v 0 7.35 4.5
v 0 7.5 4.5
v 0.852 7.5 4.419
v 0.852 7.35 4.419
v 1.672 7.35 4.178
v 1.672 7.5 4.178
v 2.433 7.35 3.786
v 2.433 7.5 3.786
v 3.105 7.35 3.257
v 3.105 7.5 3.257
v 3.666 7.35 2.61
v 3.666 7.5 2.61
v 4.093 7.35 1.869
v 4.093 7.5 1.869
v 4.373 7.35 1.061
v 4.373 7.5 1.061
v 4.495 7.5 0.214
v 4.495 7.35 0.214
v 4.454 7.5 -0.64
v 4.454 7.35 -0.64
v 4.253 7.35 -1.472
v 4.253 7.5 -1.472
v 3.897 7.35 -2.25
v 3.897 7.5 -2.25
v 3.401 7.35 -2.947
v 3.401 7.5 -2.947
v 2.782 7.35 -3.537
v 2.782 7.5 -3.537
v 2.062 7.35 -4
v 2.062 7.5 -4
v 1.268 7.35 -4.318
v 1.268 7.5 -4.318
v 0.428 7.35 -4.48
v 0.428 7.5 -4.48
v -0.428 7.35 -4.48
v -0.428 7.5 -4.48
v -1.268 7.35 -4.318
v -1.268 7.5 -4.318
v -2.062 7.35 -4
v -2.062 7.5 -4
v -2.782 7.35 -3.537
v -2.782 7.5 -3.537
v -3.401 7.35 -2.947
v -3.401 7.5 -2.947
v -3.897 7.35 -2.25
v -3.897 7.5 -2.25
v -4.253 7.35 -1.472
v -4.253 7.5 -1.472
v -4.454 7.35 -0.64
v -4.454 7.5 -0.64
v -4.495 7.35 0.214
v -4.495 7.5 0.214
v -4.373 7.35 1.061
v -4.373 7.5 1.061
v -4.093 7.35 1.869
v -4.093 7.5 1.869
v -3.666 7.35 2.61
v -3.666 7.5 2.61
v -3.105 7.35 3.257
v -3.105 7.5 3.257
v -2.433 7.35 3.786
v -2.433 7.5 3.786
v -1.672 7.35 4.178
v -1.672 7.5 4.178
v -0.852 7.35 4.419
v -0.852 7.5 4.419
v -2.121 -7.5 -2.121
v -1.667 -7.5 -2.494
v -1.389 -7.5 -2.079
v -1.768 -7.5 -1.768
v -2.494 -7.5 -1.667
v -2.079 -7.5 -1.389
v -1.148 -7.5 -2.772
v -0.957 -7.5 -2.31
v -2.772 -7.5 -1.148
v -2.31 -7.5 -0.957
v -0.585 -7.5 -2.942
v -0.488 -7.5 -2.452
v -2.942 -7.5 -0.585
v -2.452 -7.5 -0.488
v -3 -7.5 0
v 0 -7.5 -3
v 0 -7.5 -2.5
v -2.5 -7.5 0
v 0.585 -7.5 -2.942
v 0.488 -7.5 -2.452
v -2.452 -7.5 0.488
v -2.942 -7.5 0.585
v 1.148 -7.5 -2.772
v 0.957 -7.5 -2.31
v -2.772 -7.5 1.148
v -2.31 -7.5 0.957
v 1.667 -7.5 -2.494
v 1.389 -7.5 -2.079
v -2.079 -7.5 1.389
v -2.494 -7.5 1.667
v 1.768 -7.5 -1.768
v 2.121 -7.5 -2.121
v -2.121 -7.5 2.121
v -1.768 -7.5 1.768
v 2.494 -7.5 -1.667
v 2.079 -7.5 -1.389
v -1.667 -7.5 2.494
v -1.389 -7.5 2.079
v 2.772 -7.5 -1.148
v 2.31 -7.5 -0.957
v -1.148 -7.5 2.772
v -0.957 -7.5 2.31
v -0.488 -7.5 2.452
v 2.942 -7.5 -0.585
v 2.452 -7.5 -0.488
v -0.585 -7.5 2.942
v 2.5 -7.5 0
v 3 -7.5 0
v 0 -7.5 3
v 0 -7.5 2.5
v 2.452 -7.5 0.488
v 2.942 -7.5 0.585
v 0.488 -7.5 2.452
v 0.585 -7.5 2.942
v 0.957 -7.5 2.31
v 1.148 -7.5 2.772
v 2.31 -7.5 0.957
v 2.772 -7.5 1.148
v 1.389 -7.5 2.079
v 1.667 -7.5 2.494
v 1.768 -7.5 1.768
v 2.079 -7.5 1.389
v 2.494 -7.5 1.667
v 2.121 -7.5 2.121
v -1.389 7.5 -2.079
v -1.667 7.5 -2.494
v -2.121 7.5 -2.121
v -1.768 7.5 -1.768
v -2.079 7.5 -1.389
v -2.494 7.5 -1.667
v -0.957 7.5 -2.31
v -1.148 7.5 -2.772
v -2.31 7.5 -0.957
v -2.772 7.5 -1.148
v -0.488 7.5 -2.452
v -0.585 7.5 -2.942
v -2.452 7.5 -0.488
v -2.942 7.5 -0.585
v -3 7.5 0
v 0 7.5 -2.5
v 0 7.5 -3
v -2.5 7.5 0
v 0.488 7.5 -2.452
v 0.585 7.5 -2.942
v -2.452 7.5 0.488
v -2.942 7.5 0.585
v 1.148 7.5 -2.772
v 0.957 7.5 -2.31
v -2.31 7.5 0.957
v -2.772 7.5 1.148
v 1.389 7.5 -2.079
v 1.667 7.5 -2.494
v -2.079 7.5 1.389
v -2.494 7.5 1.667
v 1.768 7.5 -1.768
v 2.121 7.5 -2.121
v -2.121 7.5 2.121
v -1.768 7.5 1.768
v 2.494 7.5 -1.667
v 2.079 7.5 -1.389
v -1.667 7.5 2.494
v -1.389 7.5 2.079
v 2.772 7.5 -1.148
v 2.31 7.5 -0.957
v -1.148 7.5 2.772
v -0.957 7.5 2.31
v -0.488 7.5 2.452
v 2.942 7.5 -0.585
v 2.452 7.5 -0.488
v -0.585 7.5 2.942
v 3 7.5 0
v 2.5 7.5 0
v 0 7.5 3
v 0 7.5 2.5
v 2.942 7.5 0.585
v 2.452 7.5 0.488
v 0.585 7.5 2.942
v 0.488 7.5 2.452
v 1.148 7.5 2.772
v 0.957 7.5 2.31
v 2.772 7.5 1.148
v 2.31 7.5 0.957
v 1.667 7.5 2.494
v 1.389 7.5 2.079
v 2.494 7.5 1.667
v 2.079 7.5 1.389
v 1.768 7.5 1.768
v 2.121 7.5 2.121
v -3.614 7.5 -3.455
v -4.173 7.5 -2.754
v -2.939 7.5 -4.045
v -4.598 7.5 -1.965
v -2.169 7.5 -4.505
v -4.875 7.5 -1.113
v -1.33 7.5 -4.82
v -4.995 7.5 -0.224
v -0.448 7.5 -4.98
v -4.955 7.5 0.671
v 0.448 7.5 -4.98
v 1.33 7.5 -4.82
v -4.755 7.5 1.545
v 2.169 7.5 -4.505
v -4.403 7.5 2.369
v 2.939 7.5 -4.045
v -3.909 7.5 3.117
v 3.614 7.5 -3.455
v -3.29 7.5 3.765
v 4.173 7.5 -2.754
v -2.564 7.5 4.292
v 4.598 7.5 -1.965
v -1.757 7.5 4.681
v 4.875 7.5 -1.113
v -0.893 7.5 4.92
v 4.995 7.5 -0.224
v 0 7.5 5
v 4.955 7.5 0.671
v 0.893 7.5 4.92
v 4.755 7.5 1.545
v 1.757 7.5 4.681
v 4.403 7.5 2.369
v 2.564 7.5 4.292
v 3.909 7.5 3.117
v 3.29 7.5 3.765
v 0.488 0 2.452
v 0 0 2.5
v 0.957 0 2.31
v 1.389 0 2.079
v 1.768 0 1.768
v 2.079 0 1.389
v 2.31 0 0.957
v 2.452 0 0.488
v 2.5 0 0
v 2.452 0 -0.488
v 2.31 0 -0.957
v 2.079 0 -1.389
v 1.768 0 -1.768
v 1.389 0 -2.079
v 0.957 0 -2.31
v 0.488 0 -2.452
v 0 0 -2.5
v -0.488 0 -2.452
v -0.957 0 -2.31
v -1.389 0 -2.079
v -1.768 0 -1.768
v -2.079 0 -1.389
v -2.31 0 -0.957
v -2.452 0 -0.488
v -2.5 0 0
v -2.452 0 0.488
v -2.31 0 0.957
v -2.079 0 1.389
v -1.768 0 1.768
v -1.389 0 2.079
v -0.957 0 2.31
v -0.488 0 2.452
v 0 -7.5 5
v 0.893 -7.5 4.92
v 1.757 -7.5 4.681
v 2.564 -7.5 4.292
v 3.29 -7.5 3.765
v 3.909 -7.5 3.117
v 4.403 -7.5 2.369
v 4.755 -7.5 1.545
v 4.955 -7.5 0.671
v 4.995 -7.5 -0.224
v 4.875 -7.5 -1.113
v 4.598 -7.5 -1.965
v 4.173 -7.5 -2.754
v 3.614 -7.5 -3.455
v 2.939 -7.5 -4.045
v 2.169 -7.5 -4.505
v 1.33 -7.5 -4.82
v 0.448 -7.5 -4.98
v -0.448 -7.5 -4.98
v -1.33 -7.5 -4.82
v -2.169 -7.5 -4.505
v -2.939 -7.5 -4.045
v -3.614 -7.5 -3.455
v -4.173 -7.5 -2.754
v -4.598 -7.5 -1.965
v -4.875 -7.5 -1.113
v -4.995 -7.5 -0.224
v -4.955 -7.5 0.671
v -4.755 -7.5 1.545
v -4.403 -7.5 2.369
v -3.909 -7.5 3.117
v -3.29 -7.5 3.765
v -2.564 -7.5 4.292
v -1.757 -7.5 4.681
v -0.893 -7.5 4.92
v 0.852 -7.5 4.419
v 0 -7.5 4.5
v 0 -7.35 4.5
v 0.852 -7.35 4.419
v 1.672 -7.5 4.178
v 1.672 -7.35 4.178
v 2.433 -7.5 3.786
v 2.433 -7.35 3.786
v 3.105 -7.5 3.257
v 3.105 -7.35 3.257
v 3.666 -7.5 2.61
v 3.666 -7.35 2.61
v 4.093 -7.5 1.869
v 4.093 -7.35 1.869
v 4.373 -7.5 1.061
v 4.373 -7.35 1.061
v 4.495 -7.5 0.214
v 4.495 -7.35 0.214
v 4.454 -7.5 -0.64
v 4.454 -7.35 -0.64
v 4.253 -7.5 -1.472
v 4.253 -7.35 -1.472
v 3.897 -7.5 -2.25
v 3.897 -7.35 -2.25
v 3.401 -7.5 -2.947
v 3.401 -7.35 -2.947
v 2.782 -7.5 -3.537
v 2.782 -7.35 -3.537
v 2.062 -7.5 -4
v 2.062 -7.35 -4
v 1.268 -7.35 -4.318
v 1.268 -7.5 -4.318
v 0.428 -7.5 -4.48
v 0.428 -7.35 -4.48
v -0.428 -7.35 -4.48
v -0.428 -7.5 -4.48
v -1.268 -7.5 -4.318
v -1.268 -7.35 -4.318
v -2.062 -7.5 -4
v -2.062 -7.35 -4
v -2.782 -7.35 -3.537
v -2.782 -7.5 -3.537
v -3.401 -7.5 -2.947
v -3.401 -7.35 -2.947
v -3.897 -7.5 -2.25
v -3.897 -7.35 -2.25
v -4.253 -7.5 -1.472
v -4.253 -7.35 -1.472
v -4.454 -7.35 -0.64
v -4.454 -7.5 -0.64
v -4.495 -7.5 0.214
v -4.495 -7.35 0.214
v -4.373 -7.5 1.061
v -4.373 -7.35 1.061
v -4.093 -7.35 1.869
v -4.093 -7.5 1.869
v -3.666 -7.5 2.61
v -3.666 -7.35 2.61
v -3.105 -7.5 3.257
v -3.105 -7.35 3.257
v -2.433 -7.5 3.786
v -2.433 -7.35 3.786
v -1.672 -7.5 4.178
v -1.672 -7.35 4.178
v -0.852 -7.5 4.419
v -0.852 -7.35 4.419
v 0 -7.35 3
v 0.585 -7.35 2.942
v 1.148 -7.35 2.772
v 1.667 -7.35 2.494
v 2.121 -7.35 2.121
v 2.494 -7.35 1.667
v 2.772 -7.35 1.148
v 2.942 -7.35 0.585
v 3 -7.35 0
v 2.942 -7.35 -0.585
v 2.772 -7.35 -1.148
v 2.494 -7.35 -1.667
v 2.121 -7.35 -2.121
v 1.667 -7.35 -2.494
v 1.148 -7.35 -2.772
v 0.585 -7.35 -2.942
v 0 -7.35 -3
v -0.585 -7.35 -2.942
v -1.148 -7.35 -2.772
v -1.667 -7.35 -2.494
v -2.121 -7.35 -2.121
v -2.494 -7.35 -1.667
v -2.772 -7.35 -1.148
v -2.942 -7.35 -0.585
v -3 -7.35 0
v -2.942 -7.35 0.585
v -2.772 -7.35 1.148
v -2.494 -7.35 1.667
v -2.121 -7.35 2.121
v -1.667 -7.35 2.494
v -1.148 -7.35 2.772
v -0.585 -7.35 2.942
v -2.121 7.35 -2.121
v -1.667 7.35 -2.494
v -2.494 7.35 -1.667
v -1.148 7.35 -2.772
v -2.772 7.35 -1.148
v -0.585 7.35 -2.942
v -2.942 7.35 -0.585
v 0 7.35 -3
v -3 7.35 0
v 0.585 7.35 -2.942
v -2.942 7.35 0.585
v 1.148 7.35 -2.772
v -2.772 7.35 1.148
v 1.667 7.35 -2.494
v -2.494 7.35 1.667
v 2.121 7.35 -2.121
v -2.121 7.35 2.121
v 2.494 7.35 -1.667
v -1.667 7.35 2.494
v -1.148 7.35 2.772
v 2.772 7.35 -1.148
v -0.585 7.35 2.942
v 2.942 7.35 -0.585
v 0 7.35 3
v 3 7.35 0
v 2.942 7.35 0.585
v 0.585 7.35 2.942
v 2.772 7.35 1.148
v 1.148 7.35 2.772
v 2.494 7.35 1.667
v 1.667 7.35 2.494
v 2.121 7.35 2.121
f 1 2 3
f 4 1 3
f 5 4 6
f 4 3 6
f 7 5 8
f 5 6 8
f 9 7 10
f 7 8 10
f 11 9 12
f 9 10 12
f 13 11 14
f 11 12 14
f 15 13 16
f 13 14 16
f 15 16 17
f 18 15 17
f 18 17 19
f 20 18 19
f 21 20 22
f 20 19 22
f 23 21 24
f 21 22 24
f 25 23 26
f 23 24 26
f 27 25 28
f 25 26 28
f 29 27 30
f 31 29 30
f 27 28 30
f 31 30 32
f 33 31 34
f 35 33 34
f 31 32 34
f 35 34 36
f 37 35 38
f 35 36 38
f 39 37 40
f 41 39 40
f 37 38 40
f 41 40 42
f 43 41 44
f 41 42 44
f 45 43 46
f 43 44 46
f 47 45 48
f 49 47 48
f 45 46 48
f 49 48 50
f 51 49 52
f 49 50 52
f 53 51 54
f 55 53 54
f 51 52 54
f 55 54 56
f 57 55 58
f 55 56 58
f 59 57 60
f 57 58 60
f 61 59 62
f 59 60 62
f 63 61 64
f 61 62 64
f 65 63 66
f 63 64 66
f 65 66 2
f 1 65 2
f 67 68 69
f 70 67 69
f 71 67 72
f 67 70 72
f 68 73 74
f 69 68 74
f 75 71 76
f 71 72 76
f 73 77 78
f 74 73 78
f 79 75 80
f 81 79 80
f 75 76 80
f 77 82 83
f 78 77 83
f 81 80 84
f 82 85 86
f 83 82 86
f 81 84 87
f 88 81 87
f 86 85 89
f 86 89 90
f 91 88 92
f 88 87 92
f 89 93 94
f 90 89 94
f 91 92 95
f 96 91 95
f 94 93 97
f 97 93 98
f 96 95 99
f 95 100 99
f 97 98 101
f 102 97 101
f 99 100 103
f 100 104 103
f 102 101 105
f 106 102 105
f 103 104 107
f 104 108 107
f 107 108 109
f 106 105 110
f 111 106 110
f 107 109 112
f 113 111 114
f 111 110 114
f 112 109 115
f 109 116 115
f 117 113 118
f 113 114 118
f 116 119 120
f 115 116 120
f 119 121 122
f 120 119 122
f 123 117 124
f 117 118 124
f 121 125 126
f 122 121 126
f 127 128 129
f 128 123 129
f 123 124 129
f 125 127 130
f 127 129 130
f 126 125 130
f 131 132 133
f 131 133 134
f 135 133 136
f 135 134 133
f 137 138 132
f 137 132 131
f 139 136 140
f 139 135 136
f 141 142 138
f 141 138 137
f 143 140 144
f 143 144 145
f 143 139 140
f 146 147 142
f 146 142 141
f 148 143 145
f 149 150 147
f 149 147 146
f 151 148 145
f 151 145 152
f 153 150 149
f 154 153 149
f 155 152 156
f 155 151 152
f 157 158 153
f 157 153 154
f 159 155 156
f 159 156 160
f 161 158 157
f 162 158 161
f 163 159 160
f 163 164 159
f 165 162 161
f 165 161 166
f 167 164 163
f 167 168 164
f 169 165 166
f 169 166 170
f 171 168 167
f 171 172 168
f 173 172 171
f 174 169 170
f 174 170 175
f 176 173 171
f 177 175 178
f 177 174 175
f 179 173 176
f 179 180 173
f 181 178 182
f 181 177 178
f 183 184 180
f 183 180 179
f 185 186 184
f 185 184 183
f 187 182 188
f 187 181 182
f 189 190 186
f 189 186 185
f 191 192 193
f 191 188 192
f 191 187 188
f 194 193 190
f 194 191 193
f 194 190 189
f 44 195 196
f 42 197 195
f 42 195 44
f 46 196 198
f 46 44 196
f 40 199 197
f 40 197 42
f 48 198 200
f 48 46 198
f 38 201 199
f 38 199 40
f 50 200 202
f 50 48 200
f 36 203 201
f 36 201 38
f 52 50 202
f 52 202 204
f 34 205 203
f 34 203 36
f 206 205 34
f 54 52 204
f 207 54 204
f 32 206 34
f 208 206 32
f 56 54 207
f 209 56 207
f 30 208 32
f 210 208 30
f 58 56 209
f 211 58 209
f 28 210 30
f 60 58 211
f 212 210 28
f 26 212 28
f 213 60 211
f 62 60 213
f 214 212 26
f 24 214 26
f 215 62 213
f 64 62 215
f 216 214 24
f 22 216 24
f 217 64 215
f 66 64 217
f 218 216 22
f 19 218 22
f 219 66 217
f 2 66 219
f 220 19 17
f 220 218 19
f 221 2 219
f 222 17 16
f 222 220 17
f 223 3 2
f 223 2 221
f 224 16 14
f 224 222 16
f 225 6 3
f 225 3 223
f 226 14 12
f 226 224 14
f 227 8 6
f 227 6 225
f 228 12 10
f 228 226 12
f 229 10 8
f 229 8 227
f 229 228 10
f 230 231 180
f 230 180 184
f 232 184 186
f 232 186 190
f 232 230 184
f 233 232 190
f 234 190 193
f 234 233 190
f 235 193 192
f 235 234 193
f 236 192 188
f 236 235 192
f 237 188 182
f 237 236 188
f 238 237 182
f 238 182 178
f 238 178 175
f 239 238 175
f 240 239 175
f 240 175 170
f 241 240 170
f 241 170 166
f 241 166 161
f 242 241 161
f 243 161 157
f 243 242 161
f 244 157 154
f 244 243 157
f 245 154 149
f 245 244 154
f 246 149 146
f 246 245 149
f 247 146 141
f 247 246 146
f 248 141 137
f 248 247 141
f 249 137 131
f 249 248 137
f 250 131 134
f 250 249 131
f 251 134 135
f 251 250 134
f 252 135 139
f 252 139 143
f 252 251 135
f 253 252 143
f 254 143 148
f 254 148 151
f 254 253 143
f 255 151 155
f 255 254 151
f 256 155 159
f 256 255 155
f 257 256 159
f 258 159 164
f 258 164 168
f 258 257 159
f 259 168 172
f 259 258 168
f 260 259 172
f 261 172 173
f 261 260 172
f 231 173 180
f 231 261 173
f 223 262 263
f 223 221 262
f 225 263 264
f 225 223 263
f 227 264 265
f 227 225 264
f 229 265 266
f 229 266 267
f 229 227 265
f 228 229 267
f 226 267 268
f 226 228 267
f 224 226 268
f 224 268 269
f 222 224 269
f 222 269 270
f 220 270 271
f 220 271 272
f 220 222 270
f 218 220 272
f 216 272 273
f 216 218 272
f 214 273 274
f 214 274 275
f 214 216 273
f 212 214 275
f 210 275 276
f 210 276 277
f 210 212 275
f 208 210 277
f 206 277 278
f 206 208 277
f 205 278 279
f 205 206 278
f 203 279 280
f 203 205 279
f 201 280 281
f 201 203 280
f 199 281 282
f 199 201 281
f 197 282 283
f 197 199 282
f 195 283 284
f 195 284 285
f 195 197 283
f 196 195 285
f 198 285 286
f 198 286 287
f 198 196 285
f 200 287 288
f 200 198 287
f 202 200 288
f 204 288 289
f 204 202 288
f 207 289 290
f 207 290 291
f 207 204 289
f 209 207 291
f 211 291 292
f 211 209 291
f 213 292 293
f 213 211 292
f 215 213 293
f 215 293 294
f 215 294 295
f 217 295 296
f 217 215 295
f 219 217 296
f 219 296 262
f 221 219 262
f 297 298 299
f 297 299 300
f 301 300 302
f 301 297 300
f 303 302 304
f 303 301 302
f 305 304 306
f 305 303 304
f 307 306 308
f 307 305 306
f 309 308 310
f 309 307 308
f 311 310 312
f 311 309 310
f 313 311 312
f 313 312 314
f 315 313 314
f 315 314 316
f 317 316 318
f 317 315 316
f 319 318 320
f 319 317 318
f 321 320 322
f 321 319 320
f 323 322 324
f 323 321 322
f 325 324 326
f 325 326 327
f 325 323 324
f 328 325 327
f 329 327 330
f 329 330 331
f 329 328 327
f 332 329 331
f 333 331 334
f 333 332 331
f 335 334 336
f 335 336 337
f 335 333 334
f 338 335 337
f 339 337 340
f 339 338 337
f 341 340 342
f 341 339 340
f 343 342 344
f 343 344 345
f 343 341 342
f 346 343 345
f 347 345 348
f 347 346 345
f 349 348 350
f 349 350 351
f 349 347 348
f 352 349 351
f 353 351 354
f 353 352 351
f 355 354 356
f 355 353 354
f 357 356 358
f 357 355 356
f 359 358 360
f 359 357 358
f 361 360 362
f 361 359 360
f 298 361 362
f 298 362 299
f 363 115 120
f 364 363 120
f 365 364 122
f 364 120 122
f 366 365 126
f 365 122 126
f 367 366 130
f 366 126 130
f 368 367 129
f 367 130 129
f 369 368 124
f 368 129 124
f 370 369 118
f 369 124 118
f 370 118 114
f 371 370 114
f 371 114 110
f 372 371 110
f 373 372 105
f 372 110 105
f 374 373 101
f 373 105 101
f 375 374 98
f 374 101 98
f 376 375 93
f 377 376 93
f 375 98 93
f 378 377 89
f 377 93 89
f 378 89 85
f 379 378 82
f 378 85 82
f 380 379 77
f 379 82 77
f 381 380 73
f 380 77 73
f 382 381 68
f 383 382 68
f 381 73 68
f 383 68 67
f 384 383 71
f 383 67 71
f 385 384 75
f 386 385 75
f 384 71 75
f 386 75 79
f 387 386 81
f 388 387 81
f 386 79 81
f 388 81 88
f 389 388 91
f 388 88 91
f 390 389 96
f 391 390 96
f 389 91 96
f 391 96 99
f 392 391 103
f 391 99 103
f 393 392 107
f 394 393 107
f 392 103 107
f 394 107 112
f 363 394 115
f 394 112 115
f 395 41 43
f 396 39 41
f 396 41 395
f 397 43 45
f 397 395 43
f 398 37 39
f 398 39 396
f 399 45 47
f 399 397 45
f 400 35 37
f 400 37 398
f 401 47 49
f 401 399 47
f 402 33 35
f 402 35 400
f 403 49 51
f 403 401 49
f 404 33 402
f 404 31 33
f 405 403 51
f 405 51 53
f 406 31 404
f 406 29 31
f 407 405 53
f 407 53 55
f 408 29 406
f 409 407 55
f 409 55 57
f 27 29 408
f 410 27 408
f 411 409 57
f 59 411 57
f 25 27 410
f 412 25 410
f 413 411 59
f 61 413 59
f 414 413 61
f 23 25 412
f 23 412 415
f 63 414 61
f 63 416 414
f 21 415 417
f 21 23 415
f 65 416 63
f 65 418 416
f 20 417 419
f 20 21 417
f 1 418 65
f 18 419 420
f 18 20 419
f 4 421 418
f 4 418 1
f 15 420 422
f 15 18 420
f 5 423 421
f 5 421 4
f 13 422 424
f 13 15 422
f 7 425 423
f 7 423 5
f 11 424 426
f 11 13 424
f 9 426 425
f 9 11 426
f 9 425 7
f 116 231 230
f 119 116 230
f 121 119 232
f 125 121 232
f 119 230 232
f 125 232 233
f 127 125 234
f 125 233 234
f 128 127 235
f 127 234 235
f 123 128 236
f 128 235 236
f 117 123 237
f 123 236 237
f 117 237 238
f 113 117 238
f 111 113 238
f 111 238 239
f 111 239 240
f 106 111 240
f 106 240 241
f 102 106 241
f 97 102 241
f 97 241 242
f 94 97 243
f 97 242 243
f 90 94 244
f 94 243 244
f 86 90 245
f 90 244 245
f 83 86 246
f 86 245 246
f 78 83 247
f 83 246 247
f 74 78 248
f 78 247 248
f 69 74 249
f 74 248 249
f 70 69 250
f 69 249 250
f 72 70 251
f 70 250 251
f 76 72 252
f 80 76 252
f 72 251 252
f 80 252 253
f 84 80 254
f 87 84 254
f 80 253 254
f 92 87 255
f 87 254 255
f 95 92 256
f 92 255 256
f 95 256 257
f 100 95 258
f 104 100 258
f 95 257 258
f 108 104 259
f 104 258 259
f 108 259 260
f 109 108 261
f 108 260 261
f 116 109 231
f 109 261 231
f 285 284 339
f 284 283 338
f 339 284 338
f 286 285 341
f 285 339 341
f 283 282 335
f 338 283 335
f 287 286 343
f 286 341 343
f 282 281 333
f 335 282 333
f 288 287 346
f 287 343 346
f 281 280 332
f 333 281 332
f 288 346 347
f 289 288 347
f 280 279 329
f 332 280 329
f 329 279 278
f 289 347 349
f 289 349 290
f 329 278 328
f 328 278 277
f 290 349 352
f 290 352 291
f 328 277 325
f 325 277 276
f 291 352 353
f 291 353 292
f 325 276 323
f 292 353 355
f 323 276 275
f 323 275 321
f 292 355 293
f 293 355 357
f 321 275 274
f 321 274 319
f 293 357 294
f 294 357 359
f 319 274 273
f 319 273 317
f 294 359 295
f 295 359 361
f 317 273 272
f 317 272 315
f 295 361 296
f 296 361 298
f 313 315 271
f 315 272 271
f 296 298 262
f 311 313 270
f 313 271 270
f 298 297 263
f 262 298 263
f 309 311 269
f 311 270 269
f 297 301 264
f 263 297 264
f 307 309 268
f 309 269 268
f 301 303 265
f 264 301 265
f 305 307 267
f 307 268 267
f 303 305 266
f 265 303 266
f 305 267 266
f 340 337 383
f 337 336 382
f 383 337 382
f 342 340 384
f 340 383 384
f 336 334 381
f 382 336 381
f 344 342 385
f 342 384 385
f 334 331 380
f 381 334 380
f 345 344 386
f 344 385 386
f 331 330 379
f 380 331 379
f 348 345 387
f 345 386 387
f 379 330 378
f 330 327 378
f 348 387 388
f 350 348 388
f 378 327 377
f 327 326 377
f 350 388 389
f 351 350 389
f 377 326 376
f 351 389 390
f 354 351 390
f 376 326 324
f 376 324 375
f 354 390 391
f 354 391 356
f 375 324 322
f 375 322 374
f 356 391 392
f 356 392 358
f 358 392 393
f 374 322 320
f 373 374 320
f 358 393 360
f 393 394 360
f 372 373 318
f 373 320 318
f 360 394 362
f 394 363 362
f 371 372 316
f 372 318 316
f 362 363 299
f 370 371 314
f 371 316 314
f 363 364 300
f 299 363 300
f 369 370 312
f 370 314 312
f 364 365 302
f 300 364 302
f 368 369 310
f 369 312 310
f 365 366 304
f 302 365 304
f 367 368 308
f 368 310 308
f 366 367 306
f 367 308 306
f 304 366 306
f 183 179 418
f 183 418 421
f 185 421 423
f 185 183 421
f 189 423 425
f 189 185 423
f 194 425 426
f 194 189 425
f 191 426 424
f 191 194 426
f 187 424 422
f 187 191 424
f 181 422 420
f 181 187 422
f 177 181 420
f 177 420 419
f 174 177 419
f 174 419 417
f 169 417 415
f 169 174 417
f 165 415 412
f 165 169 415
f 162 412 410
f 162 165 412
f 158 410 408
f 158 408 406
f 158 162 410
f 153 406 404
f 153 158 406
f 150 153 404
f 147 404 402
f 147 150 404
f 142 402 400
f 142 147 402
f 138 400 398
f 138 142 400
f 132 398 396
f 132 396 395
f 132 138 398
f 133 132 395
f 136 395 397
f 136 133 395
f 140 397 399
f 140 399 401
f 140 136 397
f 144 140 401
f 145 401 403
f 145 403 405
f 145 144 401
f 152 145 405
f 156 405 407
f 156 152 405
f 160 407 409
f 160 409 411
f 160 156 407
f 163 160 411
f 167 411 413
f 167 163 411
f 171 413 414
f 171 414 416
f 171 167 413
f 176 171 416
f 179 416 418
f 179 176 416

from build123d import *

# Parameters (mm, degrees)
SKETCH_1_R          = 5
SKETCH_1_R_2        = 2.5
EXTRUDE_1_DEPTH     = 7.5
SKETCH_2_R          = 4.5
SKETCH_2_R_2        = 3
CUT_EXTRUDE_1_DEPTH = 0.15


with BuildPart() as part:
    # Эскиз1 → Бобышка-Вытянуть1 (new body)
    with BuildSketch(Plane(origin=(0, 0, 0), x_dir=(1, 0, 0), z_dir=(0, 1, 0))):
        with Locations(Location((0, 0, 0), (0, 0, 270))):
            Circle(SKETCH_1_R)
        with Locations(Location((0, 0, 0), (0, 0, 270))):
            Circle(SKETCH_1_R_2, mode=Mode.SUBTRACT)
    extrude(amount=EXTRUDE_1_DEPTH)

    # Эскиз2 → Вырез-Вытянуть1 (cut)
    with BuildSketch(Plane(origin=(0, 7.5, 0), x_dir=(1, 0, 0), z_dir=(0, 1, 0))):
        with Locations(Location((0, 0, 0), (0, 0, 270))):
            Circle(SKETCH_2_R)
        with Locations(Location((0, 0, 0), (0, 0, 270))):
            Circle(SKETCH_2_R_2, mode=Mode.SUBTRACT)
    extrude(amount=-CUT_EXTRUDE_1_DEPTH, mode=Mode.SUBTRACT)

    # Зеркальное отражение1: part across plane


with BuildPart() as part_1:
    add(part.part)
    add(part.part.mirror(Plane.ZX))


solid = part_1.part
